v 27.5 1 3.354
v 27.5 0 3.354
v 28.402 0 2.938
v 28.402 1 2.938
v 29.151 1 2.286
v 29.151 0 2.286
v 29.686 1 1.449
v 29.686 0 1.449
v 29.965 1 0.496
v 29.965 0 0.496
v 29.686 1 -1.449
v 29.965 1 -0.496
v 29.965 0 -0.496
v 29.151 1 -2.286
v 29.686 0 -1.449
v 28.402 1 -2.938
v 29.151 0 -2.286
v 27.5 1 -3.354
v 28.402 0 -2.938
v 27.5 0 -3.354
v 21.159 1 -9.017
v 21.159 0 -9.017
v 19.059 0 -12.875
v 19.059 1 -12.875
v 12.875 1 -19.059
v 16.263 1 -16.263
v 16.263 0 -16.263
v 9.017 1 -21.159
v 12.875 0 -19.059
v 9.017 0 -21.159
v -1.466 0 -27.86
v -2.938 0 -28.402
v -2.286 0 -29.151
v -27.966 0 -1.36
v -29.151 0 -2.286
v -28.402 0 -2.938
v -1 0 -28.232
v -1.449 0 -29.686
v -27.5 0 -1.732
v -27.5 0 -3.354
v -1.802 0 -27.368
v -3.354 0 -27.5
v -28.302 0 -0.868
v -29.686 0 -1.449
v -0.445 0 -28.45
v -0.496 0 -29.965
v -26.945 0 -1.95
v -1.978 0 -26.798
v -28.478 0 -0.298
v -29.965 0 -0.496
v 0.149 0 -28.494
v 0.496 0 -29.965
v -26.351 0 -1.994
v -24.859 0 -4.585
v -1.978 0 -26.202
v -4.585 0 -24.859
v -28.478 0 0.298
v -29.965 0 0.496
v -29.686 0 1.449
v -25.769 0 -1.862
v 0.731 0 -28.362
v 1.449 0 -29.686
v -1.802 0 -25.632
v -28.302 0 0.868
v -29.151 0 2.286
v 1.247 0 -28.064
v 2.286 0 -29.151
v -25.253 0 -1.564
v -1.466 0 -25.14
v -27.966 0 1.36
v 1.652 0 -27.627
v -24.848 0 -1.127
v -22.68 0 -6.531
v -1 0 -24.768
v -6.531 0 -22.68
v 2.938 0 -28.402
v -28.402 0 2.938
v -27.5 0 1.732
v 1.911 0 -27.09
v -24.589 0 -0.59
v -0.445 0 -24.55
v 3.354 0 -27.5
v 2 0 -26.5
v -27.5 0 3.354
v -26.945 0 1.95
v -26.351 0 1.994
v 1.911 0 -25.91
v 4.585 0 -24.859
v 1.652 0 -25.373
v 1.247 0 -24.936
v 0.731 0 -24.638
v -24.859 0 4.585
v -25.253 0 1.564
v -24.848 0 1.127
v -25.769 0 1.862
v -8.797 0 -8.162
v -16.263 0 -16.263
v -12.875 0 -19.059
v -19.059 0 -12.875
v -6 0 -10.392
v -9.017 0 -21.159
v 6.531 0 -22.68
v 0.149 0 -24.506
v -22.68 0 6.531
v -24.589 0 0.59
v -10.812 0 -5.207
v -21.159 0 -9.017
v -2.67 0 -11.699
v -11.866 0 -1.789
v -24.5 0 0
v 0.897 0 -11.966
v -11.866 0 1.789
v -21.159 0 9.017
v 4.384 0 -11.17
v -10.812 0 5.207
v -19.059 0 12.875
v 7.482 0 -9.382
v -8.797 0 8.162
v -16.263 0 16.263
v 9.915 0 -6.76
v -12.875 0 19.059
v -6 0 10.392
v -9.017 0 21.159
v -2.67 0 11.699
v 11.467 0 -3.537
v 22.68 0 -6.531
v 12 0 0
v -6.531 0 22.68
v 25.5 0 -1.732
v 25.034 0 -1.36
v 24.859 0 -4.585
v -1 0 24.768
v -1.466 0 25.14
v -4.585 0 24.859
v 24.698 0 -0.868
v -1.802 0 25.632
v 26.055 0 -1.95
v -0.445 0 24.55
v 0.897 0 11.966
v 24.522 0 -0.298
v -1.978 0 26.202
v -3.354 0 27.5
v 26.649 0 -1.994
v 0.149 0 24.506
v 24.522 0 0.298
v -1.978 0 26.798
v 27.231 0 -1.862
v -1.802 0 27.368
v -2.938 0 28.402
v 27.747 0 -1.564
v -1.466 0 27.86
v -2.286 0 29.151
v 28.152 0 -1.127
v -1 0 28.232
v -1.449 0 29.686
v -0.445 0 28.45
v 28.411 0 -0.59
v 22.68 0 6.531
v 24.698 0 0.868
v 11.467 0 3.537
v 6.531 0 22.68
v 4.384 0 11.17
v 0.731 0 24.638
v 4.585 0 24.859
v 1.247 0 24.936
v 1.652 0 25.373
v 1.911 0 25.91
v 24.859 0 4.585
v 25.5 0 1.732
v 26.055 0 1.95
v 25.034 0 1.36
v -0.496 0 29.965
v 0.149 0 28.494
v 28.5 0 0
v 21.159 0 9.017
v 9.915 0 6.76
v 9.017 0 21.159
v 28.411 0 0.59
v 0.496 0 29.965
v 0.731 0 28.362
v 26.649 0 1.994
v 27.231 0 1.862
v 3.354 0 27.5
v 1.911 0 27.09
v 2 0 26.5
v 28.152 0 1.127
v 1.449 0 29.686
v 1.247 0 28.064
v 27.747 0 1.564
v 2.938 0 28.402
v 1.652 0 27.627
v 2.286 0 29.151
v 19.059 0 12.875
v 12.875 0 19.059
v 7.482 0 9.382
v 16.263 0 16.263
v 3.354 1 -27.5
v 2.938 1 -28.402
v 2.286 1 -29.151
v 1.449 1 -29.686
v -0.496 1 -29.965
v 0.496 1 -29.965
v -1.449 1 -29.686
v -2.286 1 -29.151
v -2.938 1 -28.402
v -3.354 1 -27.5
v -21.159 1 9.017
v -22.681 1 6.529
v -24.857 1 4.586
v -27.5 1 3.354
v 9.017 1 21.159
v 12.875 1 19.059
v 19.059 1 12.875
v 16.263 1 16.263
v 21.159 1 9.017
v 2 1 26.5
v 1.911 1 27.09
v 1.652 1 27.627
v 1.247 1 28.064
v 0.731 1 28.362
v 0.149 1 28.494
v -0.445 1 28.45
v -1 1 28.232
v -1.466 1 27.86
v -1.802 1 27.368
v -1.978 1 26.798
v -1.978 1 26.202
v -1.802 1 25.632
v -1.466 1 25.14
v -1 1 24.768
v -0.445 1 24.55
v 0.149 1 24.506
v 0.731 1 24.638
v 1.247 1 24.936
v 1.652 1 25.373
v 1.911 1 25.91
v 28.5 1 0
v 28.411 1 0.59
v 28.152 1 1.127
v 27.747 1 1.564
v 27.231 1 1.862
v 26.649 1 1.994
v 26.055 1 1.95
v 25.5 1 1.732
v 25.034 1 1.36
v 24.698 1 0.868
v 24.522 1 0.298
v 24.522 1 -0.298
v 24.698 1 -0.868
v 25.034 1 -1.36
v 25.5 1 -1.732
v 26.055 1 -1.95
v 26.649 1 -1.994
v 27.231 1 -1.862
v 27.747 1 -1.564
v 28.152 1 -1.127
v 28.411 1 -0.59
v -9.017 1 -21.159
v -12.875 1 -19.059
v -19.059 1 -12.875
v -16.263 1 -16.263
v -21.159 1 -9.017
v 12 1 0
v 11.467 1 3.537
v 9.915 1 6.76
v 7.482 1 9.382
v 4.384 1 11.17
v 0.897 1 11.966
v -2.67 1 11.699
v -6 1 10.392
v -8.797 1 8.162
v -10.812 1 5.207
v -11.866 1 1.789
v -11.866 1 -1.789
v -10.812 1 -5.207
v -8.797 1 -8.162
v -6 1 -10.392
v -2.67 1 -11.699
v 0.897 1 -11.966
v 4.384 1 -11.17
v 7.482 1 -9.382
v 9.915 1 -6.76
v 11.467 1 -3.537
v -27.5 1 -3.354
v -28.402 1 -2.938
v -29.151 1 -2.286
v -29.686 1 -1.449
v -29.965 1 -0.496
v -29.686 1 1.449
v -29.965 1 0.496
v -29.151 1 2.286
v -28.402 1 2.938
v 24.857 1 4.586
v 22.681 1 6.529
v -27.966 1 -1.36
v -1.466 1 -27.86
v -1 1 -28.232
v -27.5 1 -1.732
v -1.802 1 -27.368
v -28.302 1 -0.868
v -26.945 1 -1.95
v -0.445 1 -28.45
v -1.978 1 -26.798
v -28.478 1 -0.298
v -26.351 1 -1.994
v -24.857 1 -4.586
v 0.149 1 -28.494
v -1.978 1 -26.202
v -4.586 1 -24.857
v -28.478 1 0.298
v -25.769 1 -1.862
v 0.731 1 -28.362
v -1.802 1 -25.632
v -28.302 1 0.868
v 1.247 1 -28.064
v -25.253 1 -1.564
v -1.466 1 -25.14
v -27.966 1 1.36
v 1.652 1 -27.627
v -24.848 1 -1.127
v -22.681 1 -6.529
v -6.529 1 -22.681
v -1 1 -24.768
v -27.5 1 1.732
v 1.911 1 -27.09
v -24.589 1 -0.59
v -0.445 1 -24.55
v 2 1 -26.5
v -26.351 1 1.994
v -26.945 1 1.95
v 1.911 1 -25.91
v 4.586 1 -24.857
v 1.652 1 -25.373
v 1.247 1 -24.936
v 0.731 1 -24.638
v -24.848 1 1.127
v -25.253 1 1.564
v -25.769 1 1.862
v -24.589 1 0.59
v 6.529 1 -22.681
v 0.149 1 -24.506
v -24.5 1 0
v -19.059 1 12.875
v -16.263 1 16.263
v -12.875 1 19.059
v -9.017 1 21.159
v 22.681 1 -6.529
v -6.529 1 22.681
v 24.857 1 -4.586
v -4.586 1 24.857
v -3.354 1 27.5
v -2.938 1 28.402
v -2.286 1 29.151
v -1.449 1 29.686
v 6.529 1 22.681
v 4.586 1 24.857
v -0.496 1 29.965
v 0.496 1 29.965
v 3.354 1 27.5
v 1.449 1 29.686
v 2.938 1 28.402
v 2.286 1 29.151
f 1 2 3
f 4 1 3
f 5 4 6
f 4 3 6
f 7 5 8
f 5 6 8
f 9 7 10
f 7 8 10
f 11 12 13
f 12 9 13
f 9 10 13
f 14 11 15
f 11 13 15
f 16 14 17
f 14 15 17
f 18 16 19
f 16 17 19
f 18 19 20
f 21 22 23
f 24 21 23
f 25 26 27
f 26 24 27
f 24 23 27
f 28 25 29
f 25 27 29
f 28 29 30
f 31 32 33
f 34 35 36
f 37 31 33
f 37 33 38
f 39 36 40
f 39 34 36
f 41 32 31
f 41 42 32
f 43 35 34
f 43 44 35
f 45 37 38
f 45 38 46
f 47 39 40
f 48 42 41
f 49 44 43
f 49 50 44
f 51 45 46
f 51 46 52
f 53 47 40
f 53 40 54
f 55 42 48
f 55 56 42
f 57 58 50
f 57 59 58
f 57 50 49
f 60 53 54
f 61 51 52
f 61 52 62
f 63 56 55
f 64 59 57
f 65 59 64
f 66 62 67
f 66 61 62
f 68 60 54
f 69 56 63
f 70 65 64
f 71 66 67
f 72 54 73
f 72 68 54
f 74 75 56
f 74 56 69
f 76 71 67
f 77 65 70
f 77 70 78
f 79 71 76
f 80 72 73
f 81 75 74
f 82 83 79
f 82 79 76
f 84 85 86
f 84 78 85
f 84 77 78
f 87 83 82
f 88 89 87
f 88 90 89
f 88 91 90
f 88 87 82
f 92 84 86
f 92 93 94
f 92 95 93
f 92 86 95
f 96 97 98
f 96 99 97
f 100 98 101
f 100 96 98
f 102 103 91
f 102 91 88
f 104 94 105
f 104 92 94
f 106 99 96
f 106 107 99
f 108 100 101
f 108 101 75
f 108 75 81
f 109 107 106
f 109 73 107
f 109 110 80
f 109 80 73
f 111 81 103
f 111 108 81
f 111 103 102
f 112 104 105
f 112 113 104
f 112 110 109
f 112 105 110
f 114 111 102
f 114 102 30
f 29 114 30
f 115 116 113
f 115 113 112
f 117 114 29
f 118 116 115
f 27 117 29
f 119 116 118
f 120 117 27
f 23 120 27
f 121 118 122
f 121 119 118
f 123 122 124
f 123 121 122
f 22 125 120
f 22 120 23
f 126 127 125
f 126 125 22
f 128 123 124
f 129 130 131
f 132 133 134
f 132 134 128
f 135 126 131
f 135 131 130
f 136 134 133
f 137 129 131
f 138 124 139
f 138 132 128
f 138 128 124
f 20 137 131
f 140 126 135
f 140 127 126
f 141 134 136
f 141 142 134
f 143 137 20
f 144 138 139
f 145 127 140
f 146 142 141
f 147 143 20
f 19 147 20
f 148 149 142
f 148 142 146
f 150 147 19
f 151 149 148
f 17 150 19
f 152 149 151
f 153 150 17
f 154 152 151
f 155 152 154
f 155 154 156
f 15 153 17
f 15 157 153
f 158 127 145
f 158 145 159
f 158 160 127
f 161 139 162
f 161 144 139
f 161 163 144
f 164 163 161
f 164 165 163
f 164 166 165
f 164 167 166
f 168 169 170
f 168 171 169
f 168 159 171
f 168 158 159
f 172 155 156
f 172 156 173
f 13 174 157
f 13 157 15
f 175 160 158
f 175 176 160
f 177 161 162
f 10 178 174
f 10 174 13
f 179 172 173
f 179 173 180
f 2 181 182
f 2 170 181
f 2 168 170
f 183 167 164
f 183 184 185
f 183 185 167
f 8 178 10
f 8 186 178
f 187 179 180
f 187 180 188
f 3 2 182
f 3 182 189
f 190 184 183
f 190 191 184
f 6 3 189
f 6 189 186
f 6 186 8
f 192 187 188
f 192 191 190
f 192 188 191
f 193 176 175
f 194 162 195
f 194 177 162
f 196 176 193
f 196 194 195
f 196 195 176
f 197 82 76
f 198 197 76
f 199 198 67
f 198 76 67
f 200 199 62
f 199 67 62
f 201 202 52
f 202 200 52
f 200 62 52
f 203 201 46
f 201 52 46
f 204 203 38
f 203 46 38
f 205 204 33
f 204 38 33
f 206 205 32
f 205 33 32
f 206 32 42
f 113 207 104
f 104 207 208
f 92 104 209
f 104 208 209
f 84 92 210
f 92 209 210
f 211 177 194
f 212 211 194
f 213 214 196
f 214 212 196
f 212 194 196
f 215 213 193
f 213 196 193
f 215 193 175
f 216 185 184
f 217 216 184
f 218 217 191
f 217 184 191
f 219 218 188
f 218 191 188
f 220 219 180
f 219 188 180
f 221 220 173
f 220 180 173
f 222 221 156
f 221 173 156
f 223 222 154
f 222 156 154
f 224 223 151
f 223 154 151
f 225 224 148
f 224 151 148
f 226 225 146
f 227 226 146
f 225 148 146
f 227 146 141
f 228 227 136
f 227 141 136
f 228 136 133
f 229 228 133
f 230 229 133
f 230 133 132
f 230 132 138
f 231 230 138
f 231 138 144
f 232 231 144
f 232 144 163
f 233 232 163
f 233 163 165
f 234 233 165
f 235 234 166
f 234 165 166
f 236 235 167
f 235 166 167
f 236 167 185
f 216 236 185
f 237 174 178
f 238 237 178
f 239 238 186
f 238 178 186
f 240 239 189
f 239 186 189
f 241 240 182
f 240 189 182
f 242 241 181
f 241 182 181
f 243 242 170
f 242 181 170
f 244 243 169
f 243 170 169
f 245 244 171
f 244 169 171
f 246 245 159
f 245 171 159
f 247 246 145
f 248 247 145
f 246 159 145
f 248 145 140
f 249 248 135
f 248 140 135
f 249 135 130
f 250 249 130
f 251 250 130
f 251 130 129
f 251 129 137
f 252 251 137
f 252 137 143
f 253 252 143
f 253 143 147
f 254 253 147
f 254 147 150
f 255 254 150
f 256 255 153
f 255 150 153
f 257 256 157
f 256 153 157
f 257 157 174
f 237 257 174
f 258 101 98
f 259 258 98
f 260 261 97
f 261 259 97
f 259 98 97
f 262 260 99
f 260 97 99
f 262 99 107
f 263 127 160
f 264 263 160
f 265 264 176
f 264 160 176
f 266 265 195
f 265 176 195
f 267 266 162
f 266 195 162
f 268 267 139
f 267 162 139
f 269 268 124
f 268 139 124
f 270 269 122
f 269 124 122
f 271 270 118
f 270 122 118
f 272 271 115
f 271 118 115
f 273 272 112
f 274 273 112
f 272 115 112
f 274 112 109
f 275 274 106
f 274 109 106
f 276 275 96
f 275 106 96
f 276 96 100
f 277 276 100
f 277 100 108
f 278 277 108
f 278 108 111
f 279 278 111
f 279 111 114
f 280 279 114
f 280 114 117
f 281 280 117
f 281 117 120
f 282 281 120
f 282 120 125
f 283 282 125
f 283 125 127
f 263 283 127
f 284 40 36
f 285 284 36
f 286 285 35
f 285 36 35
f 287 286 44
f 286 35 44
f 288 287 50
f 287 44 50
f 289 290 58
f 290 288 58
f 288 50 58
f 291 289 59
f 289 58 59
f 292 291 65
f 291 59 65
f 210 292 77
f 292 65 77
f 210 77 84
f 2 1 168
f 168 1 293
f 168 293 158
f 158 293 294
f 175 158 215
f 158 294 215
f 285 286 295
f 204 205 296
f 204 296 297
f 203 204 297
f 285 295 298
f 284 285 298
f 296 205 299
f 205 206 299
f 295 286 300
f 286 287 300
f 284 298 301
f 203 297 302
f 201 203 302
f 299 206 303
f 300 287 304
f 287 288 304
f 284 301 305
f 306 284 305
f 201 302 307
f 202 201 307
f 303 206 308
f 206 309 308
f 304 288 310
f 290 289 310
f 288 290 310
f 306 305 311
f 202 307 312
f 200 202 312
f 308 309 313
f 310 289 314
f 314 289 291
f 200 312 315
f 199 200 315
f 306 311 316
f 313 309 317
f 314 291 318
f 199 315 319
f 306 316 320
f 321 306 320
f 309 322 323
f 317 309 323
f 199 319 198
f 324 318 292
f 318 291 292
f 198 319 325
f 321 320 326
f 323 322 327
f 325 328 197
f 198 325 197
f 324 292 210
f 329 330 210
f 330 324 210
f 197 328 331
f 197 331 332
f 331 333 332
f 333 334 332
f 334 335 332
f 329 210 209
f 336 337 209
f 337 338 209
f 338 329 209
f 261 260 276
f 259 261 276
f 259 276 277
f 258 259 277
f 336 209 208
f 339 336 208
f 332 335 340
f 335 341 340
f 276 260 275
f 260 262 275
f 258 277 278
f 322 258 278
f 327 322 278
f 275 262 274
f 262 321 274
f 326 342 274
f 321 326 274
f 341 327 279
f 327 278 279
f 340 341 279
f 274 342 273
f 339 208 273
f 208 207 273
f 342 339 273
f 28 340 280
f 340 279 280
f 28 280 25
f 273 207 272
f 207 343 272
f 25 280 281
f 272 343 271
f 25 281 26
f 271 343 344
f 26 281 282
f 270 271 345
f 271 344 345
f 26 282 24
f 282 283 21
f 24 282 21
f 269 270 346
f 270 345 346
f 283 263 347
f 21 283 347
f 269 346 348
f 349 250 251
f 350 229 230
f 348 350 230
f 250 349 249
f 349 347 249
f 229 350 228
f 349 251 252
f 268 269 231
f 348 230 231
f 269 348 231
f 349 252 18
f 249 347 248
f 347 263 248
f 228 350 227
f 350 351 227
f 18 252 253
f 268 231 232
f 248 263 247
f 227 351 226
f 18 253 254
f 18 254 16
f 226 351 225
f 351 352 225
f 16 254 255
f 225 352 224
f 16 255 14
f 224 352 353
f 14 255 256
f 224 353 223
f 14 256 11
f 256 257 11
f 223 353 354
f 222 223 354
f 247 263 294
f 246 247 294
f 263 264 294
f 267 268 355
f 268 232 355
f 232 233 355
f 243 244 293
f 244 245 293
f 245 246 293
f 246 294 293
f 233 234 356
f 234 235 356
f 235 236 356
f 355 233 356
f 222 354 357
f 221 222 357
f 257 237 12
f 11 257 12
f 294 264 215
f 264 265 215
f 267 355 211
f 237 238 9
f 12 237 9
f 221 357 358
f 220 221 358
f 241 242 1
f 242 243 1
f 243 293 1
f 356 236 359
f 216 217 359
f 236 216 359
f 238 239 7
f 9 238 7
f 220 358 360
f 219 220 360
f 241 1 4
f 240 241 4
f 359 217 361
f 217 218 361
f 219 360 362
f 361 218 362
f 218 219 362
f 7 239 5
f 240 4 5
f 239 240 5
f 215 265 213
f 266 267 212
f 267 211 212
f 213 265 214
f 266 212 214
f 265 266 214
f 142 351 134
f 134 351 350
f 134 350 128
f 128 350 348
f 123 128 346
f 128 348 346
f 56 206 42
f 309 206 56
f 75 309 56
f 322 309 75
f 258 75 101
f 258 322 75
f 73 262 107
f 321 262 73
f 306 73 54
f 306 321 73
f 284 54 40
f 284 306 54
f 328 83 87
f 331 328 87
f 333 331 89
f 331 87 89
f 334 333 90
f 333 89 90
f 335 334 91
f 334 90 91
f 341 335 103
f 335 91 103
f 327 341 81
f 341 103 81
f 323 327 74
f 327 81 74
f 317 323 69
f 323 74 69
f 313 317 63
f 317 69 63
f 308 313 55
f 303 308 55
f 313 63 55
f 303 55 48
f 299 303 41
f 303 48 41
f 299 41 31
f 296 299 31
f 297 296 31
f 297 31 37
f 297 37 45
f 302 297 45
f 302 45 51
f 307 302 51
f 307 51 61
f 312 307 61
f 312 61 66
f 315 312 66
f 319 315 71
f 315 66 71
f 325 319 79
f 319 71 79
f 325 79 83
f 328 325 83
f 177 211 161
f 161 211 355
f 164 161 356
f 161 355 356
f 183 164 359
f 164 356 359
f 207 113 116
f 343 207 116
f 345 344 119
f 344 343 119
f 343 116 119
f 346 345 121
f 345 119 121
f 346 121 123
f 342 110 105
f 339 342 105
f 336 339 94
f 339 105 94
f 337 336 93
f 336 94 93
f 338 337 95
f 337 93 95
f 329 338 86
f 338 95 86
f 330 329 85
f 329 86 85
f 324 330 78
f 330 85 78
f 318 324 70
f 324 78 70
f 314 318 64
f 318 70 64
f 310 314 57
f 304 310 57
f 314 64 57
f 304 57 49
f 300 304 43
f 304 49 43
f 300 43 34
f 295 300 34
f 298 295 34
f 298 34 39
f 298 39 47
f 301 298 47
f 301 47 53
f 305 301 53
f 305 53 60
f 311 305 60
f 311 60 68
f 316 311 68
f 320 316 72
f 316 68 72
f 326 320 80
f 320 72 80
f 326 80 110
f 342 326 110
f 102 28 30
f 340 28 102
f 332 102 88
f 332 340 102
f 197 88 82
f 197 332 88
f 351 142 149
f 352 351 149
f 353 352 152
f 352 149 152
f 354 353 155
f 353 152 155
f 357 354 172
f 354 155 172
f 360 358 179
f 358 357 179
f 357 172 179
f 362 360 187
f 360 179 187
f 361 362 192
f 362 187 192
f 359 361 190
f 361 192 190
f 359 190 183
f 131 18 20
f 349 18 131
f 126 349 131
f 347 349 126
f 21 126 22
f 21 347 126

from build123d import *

# Parameters (mm, degrees)
SKETCH1_R           = 23
BOSS_EXTRUDE1_DEPTH = 3
SKETCH2_R           = 12
CUT_EXTRUDE1_DEPTH  = 10
SKETCH3_R           = 1.75
BOSS_EXTRUDE2_DEPTH = 3
SKETCH4_R           = 2.8
CUT_EXTRUDE2_DEPTH  = 1
FILLET1_R           = 10
SKETCH5_R           = 31.123463038
CUT_EXTRUDE3_DEPTH  = 1
CUT_EXTRUDE4_DEPTH  = 1
SKETCH7_R           = 2.8
SKETCH7_R_2         = 2
BOSS_EXTRUDE3_DEPTH = 1


with BuildPart() as part:
    # Sketch1 → Boss-Extrude1 (new body)
    with BuildSketch(Plane(origin=(0, 0, 0), x_dir=(1, 0, 0), z_dir=(0, 1, 0))):
        Circle(SKETCH1_R)
    extrude(amount=BOSS_EXTRUDE1_DEPTH)

    # Sketch2 → Cut-Extrude1 (cut)
    with BuildSketch(Plane.XZ):
        Circle(SKETCH2_R)
    extrude(amount=-CUT_EXTRUDE1_DEPTH, mode=Mode.SUBTRACT)

    # Sketch3 → Boss-Extrude2 (add)
    with BuildSketch(Plane.XZ):
        with BuildLine():
            Line((-26.5, 3.5), (-22.732135843, 3.5))
            ThreePointArc((-22.732135843, 3.5), (-23, 0), (-22.732135843, -3.5))
            Line((-22.732135843, -3.5), (-26.5, -3.5))
            ThreePointArc((-26.5, -3.5), (-30, 0), (-26.5, 3.5))
        make_face()
        with Locations((-26.5, 0)):
            Circle(SKETCH3_R, mode=Mode.SUBTRACT)
        with BuildLine():
            Line((3.5, 26.5), (3.5, 22.732135843))
            ThreePointArc((3.5, 22.732135843), (0, 23), (-3.5, 22.732135843))
            Line((-3.5, 22.732135843), (-3.5, 26.5))
            ThreePointArc((-3.5, 26.5), (0, 30), (3.5, 26.5))
        make_face()
        with Locations((0, 26.5)):
            Circle(SKETCH3_R, mode=Mode.SUBTRACT)
        with BuildLine():
            Line((26.5, -3.5), (22.732135843, -3.5))
            ThreePointArc((22.732135843, -3.5), (23, 0), (22.732135843, 3.5))
            Line((22.732135843, 3.5), (26.5, 3.5))
            ThreePointArc((26.5, 3.5), (30, 0), (26.5, -3.5))
        make_face()
        with Locations((26.5, 0)):
            Circle(SKETCH3_R, mode=Mode.SUBTRACT)
        with BuildLine():
            Line((-3.5, -26.5), (-3.5, -22.732135843))
            ThreePointArc((-3.5, -22.732135843), (0, -23), (3.5, -22.732135843))
            Line((3.5, -22.732135843), (3.5, -26.5))
            ThreePointArc((3.5, -26.5), (0, -30), (-3.5, -26.5))
        make_face()
        with Locations((0, -26.5)):
            Circle(SKETCH3_R, mode=Mode.SUBTRACT)
    extrude(amount=-BOSS_EXTRUDE2_DEPTH)

    # Sketch4 → Cut-Extrude2 (cut)
    with BuildSketch(Plane.XZ):
        with Locations((-26.5, 0)):
            Circle(SKETCH4_R)
        with Locations((0, 26.5)):
            Circle(SKETCH4_R)
        with Locations((26.5, 0)):
            Circle(SKETCH4_R)
        with Locations((0, -26.5)):
            Circle(SKETCH4_R)
    extrude(amount=-CUT_EXTRUDE2_DEPTH, mode=Mode.SUBTRACT)

    # Fillet1
    fillet1_edges = [part.edges().sort_by_distance(p)[0] for p in [
        (3.5, 1.5, 22.732135843),
        (22.732135843, 1.5, 3.5),
        (22.732135843, 1.5, -3.5),
        (3.5, 1.5, -22.732135843),
        (-3.5, 1.5, -22.732135843),
        (-22.732135843, 1.5, -3.5),
        (-22.732135843, 1.5, 3.5),
        (-3.5, 1.5, 22.732135843),
    ]]
    fillet(fillet1_edges, radius=FILLET1_R)

    # Sketch5 → Cut-Extrude3 (cut)
    with BuildSketch(Plane(origin=(0, 3, 0), x_dir=(1, 0, 0), z_dir=(0, 1, 0))):
        Circle(SKETCH5_R)
    extrude(amount=-CUT_EXTRUDE3_DEPTH, mode=Mode.SUBTRACT)

    # Sketch6 → Cut-Extrude4 (cut)
    with BuildSketch(Plane(origin=(0, 2, 0), x_dir=(1, 0, 0), z_dir=(0, 1, 0))):
        with BuildLine():
            ThreePointArc((3.353997774, 27.500349406), (5.477838975, 23.697921815), (9.016591418, 21.15894797))
            ThreePointArc((9.016591418, 21.15894797), (16.263455967, 16.263455967), (21.15894797, 9.016591418))
            ThreePointArc((21.15894797, 9.016591418), (23.697921815, 5.477838975), (27.500349406, 3.353997774))
            ThreePointArc((27.500349406, 3.353997774), (30, 0), (27.500349406, -3.353997774))
            ThreePointArc((27.500349406, -3.353997774), (23.697921815, -5.477838975), (21.15894797, -9.016591418))
            ThreePointArc((21.15894797, -9.016591418), (16.263455967, -16.263455967), (9.016591418, -21.15894797))
            ThreePointArc((9.016591418, -21.15894797), (5.477838975, -23.697921815), (3.353997774, -27.500349406))
            ThreePointArc((3.353997774, -27.500349406), (0, -30), (-3.353997774, -27.500349406))
            ThreePointArc((-3.353997774, -27.500349406), (-5.477838975, -23.697921815), (-9.016591418, -21.15894797))
            ThreePointArc((-9.016591418, -21.15894797), (-16.263455967, -16.263455967), (-21.15894797, -9.016591418))
            ThreePointArc((-21.15894797, -9.016591418), (-23.697921815, -5.477838975), (-27.500349406, -3.353997774))
            ThreePointArc((-27.500349406, -3.353997774), (-30, 0), (-27.500349406, 3.353997774))
            ThreePointArc((-27.500349406, 3.353997774), (-23.697921815, 5.477838975), (-21.15894797, 9.016591418))
            ThreePointArc((-21.15894797, 9.016591418), (-16.263455967, 16.263455967), (-9.016591418, 21.15894797))
            ThreePointArc((-9.016591418, 21.15894797), (-5.477838975, 23.697921815), (-3.353997774, 27.500349406))
            ThreePointArc((-3.353997774, 27.500349406), (0, 30), (3.353997774, 27.500349406))
        make_face()
    extrude(amount=-CUT_EXTRUDE4_DEPTH, mode=Mode.SUBTRACT)

    # Sketch7 → Boss-Extrude3 (add)
    with BuildSketch(Plane.XZ):
        with Locations((0, 26.5)):
            Circle(SKETCH7_R)
        with Locations((0, 26.5)):
            Circle(SKETCH7_R_2, mode=Mode.SUBTRACT)
        with Locations((26.5, 0)):
            Circle(SKETCH7_R)
        with Locations((26.5, 0)):
            Circle(SKETCH7_R_2, mode=Mode.SUBTRACT)
        with Locations((0, -26.5)):
            Circle(SKETCH7_R)
        with Locations((0, -26.5)):
            Circle(SKETCH7_R_2, mode=Mode.SUBTRACT)
        with Locations((-26.5, 0)):
            Circle(SKETCH7_R)
        with Locations((-26.5, 0)):
            Circle(SKETCH7_R_2, mode=Mode.SUBTRACT)
    extrude(amount=-BOSS_EXTRUDE3_DEPTH)


solid = part.part
